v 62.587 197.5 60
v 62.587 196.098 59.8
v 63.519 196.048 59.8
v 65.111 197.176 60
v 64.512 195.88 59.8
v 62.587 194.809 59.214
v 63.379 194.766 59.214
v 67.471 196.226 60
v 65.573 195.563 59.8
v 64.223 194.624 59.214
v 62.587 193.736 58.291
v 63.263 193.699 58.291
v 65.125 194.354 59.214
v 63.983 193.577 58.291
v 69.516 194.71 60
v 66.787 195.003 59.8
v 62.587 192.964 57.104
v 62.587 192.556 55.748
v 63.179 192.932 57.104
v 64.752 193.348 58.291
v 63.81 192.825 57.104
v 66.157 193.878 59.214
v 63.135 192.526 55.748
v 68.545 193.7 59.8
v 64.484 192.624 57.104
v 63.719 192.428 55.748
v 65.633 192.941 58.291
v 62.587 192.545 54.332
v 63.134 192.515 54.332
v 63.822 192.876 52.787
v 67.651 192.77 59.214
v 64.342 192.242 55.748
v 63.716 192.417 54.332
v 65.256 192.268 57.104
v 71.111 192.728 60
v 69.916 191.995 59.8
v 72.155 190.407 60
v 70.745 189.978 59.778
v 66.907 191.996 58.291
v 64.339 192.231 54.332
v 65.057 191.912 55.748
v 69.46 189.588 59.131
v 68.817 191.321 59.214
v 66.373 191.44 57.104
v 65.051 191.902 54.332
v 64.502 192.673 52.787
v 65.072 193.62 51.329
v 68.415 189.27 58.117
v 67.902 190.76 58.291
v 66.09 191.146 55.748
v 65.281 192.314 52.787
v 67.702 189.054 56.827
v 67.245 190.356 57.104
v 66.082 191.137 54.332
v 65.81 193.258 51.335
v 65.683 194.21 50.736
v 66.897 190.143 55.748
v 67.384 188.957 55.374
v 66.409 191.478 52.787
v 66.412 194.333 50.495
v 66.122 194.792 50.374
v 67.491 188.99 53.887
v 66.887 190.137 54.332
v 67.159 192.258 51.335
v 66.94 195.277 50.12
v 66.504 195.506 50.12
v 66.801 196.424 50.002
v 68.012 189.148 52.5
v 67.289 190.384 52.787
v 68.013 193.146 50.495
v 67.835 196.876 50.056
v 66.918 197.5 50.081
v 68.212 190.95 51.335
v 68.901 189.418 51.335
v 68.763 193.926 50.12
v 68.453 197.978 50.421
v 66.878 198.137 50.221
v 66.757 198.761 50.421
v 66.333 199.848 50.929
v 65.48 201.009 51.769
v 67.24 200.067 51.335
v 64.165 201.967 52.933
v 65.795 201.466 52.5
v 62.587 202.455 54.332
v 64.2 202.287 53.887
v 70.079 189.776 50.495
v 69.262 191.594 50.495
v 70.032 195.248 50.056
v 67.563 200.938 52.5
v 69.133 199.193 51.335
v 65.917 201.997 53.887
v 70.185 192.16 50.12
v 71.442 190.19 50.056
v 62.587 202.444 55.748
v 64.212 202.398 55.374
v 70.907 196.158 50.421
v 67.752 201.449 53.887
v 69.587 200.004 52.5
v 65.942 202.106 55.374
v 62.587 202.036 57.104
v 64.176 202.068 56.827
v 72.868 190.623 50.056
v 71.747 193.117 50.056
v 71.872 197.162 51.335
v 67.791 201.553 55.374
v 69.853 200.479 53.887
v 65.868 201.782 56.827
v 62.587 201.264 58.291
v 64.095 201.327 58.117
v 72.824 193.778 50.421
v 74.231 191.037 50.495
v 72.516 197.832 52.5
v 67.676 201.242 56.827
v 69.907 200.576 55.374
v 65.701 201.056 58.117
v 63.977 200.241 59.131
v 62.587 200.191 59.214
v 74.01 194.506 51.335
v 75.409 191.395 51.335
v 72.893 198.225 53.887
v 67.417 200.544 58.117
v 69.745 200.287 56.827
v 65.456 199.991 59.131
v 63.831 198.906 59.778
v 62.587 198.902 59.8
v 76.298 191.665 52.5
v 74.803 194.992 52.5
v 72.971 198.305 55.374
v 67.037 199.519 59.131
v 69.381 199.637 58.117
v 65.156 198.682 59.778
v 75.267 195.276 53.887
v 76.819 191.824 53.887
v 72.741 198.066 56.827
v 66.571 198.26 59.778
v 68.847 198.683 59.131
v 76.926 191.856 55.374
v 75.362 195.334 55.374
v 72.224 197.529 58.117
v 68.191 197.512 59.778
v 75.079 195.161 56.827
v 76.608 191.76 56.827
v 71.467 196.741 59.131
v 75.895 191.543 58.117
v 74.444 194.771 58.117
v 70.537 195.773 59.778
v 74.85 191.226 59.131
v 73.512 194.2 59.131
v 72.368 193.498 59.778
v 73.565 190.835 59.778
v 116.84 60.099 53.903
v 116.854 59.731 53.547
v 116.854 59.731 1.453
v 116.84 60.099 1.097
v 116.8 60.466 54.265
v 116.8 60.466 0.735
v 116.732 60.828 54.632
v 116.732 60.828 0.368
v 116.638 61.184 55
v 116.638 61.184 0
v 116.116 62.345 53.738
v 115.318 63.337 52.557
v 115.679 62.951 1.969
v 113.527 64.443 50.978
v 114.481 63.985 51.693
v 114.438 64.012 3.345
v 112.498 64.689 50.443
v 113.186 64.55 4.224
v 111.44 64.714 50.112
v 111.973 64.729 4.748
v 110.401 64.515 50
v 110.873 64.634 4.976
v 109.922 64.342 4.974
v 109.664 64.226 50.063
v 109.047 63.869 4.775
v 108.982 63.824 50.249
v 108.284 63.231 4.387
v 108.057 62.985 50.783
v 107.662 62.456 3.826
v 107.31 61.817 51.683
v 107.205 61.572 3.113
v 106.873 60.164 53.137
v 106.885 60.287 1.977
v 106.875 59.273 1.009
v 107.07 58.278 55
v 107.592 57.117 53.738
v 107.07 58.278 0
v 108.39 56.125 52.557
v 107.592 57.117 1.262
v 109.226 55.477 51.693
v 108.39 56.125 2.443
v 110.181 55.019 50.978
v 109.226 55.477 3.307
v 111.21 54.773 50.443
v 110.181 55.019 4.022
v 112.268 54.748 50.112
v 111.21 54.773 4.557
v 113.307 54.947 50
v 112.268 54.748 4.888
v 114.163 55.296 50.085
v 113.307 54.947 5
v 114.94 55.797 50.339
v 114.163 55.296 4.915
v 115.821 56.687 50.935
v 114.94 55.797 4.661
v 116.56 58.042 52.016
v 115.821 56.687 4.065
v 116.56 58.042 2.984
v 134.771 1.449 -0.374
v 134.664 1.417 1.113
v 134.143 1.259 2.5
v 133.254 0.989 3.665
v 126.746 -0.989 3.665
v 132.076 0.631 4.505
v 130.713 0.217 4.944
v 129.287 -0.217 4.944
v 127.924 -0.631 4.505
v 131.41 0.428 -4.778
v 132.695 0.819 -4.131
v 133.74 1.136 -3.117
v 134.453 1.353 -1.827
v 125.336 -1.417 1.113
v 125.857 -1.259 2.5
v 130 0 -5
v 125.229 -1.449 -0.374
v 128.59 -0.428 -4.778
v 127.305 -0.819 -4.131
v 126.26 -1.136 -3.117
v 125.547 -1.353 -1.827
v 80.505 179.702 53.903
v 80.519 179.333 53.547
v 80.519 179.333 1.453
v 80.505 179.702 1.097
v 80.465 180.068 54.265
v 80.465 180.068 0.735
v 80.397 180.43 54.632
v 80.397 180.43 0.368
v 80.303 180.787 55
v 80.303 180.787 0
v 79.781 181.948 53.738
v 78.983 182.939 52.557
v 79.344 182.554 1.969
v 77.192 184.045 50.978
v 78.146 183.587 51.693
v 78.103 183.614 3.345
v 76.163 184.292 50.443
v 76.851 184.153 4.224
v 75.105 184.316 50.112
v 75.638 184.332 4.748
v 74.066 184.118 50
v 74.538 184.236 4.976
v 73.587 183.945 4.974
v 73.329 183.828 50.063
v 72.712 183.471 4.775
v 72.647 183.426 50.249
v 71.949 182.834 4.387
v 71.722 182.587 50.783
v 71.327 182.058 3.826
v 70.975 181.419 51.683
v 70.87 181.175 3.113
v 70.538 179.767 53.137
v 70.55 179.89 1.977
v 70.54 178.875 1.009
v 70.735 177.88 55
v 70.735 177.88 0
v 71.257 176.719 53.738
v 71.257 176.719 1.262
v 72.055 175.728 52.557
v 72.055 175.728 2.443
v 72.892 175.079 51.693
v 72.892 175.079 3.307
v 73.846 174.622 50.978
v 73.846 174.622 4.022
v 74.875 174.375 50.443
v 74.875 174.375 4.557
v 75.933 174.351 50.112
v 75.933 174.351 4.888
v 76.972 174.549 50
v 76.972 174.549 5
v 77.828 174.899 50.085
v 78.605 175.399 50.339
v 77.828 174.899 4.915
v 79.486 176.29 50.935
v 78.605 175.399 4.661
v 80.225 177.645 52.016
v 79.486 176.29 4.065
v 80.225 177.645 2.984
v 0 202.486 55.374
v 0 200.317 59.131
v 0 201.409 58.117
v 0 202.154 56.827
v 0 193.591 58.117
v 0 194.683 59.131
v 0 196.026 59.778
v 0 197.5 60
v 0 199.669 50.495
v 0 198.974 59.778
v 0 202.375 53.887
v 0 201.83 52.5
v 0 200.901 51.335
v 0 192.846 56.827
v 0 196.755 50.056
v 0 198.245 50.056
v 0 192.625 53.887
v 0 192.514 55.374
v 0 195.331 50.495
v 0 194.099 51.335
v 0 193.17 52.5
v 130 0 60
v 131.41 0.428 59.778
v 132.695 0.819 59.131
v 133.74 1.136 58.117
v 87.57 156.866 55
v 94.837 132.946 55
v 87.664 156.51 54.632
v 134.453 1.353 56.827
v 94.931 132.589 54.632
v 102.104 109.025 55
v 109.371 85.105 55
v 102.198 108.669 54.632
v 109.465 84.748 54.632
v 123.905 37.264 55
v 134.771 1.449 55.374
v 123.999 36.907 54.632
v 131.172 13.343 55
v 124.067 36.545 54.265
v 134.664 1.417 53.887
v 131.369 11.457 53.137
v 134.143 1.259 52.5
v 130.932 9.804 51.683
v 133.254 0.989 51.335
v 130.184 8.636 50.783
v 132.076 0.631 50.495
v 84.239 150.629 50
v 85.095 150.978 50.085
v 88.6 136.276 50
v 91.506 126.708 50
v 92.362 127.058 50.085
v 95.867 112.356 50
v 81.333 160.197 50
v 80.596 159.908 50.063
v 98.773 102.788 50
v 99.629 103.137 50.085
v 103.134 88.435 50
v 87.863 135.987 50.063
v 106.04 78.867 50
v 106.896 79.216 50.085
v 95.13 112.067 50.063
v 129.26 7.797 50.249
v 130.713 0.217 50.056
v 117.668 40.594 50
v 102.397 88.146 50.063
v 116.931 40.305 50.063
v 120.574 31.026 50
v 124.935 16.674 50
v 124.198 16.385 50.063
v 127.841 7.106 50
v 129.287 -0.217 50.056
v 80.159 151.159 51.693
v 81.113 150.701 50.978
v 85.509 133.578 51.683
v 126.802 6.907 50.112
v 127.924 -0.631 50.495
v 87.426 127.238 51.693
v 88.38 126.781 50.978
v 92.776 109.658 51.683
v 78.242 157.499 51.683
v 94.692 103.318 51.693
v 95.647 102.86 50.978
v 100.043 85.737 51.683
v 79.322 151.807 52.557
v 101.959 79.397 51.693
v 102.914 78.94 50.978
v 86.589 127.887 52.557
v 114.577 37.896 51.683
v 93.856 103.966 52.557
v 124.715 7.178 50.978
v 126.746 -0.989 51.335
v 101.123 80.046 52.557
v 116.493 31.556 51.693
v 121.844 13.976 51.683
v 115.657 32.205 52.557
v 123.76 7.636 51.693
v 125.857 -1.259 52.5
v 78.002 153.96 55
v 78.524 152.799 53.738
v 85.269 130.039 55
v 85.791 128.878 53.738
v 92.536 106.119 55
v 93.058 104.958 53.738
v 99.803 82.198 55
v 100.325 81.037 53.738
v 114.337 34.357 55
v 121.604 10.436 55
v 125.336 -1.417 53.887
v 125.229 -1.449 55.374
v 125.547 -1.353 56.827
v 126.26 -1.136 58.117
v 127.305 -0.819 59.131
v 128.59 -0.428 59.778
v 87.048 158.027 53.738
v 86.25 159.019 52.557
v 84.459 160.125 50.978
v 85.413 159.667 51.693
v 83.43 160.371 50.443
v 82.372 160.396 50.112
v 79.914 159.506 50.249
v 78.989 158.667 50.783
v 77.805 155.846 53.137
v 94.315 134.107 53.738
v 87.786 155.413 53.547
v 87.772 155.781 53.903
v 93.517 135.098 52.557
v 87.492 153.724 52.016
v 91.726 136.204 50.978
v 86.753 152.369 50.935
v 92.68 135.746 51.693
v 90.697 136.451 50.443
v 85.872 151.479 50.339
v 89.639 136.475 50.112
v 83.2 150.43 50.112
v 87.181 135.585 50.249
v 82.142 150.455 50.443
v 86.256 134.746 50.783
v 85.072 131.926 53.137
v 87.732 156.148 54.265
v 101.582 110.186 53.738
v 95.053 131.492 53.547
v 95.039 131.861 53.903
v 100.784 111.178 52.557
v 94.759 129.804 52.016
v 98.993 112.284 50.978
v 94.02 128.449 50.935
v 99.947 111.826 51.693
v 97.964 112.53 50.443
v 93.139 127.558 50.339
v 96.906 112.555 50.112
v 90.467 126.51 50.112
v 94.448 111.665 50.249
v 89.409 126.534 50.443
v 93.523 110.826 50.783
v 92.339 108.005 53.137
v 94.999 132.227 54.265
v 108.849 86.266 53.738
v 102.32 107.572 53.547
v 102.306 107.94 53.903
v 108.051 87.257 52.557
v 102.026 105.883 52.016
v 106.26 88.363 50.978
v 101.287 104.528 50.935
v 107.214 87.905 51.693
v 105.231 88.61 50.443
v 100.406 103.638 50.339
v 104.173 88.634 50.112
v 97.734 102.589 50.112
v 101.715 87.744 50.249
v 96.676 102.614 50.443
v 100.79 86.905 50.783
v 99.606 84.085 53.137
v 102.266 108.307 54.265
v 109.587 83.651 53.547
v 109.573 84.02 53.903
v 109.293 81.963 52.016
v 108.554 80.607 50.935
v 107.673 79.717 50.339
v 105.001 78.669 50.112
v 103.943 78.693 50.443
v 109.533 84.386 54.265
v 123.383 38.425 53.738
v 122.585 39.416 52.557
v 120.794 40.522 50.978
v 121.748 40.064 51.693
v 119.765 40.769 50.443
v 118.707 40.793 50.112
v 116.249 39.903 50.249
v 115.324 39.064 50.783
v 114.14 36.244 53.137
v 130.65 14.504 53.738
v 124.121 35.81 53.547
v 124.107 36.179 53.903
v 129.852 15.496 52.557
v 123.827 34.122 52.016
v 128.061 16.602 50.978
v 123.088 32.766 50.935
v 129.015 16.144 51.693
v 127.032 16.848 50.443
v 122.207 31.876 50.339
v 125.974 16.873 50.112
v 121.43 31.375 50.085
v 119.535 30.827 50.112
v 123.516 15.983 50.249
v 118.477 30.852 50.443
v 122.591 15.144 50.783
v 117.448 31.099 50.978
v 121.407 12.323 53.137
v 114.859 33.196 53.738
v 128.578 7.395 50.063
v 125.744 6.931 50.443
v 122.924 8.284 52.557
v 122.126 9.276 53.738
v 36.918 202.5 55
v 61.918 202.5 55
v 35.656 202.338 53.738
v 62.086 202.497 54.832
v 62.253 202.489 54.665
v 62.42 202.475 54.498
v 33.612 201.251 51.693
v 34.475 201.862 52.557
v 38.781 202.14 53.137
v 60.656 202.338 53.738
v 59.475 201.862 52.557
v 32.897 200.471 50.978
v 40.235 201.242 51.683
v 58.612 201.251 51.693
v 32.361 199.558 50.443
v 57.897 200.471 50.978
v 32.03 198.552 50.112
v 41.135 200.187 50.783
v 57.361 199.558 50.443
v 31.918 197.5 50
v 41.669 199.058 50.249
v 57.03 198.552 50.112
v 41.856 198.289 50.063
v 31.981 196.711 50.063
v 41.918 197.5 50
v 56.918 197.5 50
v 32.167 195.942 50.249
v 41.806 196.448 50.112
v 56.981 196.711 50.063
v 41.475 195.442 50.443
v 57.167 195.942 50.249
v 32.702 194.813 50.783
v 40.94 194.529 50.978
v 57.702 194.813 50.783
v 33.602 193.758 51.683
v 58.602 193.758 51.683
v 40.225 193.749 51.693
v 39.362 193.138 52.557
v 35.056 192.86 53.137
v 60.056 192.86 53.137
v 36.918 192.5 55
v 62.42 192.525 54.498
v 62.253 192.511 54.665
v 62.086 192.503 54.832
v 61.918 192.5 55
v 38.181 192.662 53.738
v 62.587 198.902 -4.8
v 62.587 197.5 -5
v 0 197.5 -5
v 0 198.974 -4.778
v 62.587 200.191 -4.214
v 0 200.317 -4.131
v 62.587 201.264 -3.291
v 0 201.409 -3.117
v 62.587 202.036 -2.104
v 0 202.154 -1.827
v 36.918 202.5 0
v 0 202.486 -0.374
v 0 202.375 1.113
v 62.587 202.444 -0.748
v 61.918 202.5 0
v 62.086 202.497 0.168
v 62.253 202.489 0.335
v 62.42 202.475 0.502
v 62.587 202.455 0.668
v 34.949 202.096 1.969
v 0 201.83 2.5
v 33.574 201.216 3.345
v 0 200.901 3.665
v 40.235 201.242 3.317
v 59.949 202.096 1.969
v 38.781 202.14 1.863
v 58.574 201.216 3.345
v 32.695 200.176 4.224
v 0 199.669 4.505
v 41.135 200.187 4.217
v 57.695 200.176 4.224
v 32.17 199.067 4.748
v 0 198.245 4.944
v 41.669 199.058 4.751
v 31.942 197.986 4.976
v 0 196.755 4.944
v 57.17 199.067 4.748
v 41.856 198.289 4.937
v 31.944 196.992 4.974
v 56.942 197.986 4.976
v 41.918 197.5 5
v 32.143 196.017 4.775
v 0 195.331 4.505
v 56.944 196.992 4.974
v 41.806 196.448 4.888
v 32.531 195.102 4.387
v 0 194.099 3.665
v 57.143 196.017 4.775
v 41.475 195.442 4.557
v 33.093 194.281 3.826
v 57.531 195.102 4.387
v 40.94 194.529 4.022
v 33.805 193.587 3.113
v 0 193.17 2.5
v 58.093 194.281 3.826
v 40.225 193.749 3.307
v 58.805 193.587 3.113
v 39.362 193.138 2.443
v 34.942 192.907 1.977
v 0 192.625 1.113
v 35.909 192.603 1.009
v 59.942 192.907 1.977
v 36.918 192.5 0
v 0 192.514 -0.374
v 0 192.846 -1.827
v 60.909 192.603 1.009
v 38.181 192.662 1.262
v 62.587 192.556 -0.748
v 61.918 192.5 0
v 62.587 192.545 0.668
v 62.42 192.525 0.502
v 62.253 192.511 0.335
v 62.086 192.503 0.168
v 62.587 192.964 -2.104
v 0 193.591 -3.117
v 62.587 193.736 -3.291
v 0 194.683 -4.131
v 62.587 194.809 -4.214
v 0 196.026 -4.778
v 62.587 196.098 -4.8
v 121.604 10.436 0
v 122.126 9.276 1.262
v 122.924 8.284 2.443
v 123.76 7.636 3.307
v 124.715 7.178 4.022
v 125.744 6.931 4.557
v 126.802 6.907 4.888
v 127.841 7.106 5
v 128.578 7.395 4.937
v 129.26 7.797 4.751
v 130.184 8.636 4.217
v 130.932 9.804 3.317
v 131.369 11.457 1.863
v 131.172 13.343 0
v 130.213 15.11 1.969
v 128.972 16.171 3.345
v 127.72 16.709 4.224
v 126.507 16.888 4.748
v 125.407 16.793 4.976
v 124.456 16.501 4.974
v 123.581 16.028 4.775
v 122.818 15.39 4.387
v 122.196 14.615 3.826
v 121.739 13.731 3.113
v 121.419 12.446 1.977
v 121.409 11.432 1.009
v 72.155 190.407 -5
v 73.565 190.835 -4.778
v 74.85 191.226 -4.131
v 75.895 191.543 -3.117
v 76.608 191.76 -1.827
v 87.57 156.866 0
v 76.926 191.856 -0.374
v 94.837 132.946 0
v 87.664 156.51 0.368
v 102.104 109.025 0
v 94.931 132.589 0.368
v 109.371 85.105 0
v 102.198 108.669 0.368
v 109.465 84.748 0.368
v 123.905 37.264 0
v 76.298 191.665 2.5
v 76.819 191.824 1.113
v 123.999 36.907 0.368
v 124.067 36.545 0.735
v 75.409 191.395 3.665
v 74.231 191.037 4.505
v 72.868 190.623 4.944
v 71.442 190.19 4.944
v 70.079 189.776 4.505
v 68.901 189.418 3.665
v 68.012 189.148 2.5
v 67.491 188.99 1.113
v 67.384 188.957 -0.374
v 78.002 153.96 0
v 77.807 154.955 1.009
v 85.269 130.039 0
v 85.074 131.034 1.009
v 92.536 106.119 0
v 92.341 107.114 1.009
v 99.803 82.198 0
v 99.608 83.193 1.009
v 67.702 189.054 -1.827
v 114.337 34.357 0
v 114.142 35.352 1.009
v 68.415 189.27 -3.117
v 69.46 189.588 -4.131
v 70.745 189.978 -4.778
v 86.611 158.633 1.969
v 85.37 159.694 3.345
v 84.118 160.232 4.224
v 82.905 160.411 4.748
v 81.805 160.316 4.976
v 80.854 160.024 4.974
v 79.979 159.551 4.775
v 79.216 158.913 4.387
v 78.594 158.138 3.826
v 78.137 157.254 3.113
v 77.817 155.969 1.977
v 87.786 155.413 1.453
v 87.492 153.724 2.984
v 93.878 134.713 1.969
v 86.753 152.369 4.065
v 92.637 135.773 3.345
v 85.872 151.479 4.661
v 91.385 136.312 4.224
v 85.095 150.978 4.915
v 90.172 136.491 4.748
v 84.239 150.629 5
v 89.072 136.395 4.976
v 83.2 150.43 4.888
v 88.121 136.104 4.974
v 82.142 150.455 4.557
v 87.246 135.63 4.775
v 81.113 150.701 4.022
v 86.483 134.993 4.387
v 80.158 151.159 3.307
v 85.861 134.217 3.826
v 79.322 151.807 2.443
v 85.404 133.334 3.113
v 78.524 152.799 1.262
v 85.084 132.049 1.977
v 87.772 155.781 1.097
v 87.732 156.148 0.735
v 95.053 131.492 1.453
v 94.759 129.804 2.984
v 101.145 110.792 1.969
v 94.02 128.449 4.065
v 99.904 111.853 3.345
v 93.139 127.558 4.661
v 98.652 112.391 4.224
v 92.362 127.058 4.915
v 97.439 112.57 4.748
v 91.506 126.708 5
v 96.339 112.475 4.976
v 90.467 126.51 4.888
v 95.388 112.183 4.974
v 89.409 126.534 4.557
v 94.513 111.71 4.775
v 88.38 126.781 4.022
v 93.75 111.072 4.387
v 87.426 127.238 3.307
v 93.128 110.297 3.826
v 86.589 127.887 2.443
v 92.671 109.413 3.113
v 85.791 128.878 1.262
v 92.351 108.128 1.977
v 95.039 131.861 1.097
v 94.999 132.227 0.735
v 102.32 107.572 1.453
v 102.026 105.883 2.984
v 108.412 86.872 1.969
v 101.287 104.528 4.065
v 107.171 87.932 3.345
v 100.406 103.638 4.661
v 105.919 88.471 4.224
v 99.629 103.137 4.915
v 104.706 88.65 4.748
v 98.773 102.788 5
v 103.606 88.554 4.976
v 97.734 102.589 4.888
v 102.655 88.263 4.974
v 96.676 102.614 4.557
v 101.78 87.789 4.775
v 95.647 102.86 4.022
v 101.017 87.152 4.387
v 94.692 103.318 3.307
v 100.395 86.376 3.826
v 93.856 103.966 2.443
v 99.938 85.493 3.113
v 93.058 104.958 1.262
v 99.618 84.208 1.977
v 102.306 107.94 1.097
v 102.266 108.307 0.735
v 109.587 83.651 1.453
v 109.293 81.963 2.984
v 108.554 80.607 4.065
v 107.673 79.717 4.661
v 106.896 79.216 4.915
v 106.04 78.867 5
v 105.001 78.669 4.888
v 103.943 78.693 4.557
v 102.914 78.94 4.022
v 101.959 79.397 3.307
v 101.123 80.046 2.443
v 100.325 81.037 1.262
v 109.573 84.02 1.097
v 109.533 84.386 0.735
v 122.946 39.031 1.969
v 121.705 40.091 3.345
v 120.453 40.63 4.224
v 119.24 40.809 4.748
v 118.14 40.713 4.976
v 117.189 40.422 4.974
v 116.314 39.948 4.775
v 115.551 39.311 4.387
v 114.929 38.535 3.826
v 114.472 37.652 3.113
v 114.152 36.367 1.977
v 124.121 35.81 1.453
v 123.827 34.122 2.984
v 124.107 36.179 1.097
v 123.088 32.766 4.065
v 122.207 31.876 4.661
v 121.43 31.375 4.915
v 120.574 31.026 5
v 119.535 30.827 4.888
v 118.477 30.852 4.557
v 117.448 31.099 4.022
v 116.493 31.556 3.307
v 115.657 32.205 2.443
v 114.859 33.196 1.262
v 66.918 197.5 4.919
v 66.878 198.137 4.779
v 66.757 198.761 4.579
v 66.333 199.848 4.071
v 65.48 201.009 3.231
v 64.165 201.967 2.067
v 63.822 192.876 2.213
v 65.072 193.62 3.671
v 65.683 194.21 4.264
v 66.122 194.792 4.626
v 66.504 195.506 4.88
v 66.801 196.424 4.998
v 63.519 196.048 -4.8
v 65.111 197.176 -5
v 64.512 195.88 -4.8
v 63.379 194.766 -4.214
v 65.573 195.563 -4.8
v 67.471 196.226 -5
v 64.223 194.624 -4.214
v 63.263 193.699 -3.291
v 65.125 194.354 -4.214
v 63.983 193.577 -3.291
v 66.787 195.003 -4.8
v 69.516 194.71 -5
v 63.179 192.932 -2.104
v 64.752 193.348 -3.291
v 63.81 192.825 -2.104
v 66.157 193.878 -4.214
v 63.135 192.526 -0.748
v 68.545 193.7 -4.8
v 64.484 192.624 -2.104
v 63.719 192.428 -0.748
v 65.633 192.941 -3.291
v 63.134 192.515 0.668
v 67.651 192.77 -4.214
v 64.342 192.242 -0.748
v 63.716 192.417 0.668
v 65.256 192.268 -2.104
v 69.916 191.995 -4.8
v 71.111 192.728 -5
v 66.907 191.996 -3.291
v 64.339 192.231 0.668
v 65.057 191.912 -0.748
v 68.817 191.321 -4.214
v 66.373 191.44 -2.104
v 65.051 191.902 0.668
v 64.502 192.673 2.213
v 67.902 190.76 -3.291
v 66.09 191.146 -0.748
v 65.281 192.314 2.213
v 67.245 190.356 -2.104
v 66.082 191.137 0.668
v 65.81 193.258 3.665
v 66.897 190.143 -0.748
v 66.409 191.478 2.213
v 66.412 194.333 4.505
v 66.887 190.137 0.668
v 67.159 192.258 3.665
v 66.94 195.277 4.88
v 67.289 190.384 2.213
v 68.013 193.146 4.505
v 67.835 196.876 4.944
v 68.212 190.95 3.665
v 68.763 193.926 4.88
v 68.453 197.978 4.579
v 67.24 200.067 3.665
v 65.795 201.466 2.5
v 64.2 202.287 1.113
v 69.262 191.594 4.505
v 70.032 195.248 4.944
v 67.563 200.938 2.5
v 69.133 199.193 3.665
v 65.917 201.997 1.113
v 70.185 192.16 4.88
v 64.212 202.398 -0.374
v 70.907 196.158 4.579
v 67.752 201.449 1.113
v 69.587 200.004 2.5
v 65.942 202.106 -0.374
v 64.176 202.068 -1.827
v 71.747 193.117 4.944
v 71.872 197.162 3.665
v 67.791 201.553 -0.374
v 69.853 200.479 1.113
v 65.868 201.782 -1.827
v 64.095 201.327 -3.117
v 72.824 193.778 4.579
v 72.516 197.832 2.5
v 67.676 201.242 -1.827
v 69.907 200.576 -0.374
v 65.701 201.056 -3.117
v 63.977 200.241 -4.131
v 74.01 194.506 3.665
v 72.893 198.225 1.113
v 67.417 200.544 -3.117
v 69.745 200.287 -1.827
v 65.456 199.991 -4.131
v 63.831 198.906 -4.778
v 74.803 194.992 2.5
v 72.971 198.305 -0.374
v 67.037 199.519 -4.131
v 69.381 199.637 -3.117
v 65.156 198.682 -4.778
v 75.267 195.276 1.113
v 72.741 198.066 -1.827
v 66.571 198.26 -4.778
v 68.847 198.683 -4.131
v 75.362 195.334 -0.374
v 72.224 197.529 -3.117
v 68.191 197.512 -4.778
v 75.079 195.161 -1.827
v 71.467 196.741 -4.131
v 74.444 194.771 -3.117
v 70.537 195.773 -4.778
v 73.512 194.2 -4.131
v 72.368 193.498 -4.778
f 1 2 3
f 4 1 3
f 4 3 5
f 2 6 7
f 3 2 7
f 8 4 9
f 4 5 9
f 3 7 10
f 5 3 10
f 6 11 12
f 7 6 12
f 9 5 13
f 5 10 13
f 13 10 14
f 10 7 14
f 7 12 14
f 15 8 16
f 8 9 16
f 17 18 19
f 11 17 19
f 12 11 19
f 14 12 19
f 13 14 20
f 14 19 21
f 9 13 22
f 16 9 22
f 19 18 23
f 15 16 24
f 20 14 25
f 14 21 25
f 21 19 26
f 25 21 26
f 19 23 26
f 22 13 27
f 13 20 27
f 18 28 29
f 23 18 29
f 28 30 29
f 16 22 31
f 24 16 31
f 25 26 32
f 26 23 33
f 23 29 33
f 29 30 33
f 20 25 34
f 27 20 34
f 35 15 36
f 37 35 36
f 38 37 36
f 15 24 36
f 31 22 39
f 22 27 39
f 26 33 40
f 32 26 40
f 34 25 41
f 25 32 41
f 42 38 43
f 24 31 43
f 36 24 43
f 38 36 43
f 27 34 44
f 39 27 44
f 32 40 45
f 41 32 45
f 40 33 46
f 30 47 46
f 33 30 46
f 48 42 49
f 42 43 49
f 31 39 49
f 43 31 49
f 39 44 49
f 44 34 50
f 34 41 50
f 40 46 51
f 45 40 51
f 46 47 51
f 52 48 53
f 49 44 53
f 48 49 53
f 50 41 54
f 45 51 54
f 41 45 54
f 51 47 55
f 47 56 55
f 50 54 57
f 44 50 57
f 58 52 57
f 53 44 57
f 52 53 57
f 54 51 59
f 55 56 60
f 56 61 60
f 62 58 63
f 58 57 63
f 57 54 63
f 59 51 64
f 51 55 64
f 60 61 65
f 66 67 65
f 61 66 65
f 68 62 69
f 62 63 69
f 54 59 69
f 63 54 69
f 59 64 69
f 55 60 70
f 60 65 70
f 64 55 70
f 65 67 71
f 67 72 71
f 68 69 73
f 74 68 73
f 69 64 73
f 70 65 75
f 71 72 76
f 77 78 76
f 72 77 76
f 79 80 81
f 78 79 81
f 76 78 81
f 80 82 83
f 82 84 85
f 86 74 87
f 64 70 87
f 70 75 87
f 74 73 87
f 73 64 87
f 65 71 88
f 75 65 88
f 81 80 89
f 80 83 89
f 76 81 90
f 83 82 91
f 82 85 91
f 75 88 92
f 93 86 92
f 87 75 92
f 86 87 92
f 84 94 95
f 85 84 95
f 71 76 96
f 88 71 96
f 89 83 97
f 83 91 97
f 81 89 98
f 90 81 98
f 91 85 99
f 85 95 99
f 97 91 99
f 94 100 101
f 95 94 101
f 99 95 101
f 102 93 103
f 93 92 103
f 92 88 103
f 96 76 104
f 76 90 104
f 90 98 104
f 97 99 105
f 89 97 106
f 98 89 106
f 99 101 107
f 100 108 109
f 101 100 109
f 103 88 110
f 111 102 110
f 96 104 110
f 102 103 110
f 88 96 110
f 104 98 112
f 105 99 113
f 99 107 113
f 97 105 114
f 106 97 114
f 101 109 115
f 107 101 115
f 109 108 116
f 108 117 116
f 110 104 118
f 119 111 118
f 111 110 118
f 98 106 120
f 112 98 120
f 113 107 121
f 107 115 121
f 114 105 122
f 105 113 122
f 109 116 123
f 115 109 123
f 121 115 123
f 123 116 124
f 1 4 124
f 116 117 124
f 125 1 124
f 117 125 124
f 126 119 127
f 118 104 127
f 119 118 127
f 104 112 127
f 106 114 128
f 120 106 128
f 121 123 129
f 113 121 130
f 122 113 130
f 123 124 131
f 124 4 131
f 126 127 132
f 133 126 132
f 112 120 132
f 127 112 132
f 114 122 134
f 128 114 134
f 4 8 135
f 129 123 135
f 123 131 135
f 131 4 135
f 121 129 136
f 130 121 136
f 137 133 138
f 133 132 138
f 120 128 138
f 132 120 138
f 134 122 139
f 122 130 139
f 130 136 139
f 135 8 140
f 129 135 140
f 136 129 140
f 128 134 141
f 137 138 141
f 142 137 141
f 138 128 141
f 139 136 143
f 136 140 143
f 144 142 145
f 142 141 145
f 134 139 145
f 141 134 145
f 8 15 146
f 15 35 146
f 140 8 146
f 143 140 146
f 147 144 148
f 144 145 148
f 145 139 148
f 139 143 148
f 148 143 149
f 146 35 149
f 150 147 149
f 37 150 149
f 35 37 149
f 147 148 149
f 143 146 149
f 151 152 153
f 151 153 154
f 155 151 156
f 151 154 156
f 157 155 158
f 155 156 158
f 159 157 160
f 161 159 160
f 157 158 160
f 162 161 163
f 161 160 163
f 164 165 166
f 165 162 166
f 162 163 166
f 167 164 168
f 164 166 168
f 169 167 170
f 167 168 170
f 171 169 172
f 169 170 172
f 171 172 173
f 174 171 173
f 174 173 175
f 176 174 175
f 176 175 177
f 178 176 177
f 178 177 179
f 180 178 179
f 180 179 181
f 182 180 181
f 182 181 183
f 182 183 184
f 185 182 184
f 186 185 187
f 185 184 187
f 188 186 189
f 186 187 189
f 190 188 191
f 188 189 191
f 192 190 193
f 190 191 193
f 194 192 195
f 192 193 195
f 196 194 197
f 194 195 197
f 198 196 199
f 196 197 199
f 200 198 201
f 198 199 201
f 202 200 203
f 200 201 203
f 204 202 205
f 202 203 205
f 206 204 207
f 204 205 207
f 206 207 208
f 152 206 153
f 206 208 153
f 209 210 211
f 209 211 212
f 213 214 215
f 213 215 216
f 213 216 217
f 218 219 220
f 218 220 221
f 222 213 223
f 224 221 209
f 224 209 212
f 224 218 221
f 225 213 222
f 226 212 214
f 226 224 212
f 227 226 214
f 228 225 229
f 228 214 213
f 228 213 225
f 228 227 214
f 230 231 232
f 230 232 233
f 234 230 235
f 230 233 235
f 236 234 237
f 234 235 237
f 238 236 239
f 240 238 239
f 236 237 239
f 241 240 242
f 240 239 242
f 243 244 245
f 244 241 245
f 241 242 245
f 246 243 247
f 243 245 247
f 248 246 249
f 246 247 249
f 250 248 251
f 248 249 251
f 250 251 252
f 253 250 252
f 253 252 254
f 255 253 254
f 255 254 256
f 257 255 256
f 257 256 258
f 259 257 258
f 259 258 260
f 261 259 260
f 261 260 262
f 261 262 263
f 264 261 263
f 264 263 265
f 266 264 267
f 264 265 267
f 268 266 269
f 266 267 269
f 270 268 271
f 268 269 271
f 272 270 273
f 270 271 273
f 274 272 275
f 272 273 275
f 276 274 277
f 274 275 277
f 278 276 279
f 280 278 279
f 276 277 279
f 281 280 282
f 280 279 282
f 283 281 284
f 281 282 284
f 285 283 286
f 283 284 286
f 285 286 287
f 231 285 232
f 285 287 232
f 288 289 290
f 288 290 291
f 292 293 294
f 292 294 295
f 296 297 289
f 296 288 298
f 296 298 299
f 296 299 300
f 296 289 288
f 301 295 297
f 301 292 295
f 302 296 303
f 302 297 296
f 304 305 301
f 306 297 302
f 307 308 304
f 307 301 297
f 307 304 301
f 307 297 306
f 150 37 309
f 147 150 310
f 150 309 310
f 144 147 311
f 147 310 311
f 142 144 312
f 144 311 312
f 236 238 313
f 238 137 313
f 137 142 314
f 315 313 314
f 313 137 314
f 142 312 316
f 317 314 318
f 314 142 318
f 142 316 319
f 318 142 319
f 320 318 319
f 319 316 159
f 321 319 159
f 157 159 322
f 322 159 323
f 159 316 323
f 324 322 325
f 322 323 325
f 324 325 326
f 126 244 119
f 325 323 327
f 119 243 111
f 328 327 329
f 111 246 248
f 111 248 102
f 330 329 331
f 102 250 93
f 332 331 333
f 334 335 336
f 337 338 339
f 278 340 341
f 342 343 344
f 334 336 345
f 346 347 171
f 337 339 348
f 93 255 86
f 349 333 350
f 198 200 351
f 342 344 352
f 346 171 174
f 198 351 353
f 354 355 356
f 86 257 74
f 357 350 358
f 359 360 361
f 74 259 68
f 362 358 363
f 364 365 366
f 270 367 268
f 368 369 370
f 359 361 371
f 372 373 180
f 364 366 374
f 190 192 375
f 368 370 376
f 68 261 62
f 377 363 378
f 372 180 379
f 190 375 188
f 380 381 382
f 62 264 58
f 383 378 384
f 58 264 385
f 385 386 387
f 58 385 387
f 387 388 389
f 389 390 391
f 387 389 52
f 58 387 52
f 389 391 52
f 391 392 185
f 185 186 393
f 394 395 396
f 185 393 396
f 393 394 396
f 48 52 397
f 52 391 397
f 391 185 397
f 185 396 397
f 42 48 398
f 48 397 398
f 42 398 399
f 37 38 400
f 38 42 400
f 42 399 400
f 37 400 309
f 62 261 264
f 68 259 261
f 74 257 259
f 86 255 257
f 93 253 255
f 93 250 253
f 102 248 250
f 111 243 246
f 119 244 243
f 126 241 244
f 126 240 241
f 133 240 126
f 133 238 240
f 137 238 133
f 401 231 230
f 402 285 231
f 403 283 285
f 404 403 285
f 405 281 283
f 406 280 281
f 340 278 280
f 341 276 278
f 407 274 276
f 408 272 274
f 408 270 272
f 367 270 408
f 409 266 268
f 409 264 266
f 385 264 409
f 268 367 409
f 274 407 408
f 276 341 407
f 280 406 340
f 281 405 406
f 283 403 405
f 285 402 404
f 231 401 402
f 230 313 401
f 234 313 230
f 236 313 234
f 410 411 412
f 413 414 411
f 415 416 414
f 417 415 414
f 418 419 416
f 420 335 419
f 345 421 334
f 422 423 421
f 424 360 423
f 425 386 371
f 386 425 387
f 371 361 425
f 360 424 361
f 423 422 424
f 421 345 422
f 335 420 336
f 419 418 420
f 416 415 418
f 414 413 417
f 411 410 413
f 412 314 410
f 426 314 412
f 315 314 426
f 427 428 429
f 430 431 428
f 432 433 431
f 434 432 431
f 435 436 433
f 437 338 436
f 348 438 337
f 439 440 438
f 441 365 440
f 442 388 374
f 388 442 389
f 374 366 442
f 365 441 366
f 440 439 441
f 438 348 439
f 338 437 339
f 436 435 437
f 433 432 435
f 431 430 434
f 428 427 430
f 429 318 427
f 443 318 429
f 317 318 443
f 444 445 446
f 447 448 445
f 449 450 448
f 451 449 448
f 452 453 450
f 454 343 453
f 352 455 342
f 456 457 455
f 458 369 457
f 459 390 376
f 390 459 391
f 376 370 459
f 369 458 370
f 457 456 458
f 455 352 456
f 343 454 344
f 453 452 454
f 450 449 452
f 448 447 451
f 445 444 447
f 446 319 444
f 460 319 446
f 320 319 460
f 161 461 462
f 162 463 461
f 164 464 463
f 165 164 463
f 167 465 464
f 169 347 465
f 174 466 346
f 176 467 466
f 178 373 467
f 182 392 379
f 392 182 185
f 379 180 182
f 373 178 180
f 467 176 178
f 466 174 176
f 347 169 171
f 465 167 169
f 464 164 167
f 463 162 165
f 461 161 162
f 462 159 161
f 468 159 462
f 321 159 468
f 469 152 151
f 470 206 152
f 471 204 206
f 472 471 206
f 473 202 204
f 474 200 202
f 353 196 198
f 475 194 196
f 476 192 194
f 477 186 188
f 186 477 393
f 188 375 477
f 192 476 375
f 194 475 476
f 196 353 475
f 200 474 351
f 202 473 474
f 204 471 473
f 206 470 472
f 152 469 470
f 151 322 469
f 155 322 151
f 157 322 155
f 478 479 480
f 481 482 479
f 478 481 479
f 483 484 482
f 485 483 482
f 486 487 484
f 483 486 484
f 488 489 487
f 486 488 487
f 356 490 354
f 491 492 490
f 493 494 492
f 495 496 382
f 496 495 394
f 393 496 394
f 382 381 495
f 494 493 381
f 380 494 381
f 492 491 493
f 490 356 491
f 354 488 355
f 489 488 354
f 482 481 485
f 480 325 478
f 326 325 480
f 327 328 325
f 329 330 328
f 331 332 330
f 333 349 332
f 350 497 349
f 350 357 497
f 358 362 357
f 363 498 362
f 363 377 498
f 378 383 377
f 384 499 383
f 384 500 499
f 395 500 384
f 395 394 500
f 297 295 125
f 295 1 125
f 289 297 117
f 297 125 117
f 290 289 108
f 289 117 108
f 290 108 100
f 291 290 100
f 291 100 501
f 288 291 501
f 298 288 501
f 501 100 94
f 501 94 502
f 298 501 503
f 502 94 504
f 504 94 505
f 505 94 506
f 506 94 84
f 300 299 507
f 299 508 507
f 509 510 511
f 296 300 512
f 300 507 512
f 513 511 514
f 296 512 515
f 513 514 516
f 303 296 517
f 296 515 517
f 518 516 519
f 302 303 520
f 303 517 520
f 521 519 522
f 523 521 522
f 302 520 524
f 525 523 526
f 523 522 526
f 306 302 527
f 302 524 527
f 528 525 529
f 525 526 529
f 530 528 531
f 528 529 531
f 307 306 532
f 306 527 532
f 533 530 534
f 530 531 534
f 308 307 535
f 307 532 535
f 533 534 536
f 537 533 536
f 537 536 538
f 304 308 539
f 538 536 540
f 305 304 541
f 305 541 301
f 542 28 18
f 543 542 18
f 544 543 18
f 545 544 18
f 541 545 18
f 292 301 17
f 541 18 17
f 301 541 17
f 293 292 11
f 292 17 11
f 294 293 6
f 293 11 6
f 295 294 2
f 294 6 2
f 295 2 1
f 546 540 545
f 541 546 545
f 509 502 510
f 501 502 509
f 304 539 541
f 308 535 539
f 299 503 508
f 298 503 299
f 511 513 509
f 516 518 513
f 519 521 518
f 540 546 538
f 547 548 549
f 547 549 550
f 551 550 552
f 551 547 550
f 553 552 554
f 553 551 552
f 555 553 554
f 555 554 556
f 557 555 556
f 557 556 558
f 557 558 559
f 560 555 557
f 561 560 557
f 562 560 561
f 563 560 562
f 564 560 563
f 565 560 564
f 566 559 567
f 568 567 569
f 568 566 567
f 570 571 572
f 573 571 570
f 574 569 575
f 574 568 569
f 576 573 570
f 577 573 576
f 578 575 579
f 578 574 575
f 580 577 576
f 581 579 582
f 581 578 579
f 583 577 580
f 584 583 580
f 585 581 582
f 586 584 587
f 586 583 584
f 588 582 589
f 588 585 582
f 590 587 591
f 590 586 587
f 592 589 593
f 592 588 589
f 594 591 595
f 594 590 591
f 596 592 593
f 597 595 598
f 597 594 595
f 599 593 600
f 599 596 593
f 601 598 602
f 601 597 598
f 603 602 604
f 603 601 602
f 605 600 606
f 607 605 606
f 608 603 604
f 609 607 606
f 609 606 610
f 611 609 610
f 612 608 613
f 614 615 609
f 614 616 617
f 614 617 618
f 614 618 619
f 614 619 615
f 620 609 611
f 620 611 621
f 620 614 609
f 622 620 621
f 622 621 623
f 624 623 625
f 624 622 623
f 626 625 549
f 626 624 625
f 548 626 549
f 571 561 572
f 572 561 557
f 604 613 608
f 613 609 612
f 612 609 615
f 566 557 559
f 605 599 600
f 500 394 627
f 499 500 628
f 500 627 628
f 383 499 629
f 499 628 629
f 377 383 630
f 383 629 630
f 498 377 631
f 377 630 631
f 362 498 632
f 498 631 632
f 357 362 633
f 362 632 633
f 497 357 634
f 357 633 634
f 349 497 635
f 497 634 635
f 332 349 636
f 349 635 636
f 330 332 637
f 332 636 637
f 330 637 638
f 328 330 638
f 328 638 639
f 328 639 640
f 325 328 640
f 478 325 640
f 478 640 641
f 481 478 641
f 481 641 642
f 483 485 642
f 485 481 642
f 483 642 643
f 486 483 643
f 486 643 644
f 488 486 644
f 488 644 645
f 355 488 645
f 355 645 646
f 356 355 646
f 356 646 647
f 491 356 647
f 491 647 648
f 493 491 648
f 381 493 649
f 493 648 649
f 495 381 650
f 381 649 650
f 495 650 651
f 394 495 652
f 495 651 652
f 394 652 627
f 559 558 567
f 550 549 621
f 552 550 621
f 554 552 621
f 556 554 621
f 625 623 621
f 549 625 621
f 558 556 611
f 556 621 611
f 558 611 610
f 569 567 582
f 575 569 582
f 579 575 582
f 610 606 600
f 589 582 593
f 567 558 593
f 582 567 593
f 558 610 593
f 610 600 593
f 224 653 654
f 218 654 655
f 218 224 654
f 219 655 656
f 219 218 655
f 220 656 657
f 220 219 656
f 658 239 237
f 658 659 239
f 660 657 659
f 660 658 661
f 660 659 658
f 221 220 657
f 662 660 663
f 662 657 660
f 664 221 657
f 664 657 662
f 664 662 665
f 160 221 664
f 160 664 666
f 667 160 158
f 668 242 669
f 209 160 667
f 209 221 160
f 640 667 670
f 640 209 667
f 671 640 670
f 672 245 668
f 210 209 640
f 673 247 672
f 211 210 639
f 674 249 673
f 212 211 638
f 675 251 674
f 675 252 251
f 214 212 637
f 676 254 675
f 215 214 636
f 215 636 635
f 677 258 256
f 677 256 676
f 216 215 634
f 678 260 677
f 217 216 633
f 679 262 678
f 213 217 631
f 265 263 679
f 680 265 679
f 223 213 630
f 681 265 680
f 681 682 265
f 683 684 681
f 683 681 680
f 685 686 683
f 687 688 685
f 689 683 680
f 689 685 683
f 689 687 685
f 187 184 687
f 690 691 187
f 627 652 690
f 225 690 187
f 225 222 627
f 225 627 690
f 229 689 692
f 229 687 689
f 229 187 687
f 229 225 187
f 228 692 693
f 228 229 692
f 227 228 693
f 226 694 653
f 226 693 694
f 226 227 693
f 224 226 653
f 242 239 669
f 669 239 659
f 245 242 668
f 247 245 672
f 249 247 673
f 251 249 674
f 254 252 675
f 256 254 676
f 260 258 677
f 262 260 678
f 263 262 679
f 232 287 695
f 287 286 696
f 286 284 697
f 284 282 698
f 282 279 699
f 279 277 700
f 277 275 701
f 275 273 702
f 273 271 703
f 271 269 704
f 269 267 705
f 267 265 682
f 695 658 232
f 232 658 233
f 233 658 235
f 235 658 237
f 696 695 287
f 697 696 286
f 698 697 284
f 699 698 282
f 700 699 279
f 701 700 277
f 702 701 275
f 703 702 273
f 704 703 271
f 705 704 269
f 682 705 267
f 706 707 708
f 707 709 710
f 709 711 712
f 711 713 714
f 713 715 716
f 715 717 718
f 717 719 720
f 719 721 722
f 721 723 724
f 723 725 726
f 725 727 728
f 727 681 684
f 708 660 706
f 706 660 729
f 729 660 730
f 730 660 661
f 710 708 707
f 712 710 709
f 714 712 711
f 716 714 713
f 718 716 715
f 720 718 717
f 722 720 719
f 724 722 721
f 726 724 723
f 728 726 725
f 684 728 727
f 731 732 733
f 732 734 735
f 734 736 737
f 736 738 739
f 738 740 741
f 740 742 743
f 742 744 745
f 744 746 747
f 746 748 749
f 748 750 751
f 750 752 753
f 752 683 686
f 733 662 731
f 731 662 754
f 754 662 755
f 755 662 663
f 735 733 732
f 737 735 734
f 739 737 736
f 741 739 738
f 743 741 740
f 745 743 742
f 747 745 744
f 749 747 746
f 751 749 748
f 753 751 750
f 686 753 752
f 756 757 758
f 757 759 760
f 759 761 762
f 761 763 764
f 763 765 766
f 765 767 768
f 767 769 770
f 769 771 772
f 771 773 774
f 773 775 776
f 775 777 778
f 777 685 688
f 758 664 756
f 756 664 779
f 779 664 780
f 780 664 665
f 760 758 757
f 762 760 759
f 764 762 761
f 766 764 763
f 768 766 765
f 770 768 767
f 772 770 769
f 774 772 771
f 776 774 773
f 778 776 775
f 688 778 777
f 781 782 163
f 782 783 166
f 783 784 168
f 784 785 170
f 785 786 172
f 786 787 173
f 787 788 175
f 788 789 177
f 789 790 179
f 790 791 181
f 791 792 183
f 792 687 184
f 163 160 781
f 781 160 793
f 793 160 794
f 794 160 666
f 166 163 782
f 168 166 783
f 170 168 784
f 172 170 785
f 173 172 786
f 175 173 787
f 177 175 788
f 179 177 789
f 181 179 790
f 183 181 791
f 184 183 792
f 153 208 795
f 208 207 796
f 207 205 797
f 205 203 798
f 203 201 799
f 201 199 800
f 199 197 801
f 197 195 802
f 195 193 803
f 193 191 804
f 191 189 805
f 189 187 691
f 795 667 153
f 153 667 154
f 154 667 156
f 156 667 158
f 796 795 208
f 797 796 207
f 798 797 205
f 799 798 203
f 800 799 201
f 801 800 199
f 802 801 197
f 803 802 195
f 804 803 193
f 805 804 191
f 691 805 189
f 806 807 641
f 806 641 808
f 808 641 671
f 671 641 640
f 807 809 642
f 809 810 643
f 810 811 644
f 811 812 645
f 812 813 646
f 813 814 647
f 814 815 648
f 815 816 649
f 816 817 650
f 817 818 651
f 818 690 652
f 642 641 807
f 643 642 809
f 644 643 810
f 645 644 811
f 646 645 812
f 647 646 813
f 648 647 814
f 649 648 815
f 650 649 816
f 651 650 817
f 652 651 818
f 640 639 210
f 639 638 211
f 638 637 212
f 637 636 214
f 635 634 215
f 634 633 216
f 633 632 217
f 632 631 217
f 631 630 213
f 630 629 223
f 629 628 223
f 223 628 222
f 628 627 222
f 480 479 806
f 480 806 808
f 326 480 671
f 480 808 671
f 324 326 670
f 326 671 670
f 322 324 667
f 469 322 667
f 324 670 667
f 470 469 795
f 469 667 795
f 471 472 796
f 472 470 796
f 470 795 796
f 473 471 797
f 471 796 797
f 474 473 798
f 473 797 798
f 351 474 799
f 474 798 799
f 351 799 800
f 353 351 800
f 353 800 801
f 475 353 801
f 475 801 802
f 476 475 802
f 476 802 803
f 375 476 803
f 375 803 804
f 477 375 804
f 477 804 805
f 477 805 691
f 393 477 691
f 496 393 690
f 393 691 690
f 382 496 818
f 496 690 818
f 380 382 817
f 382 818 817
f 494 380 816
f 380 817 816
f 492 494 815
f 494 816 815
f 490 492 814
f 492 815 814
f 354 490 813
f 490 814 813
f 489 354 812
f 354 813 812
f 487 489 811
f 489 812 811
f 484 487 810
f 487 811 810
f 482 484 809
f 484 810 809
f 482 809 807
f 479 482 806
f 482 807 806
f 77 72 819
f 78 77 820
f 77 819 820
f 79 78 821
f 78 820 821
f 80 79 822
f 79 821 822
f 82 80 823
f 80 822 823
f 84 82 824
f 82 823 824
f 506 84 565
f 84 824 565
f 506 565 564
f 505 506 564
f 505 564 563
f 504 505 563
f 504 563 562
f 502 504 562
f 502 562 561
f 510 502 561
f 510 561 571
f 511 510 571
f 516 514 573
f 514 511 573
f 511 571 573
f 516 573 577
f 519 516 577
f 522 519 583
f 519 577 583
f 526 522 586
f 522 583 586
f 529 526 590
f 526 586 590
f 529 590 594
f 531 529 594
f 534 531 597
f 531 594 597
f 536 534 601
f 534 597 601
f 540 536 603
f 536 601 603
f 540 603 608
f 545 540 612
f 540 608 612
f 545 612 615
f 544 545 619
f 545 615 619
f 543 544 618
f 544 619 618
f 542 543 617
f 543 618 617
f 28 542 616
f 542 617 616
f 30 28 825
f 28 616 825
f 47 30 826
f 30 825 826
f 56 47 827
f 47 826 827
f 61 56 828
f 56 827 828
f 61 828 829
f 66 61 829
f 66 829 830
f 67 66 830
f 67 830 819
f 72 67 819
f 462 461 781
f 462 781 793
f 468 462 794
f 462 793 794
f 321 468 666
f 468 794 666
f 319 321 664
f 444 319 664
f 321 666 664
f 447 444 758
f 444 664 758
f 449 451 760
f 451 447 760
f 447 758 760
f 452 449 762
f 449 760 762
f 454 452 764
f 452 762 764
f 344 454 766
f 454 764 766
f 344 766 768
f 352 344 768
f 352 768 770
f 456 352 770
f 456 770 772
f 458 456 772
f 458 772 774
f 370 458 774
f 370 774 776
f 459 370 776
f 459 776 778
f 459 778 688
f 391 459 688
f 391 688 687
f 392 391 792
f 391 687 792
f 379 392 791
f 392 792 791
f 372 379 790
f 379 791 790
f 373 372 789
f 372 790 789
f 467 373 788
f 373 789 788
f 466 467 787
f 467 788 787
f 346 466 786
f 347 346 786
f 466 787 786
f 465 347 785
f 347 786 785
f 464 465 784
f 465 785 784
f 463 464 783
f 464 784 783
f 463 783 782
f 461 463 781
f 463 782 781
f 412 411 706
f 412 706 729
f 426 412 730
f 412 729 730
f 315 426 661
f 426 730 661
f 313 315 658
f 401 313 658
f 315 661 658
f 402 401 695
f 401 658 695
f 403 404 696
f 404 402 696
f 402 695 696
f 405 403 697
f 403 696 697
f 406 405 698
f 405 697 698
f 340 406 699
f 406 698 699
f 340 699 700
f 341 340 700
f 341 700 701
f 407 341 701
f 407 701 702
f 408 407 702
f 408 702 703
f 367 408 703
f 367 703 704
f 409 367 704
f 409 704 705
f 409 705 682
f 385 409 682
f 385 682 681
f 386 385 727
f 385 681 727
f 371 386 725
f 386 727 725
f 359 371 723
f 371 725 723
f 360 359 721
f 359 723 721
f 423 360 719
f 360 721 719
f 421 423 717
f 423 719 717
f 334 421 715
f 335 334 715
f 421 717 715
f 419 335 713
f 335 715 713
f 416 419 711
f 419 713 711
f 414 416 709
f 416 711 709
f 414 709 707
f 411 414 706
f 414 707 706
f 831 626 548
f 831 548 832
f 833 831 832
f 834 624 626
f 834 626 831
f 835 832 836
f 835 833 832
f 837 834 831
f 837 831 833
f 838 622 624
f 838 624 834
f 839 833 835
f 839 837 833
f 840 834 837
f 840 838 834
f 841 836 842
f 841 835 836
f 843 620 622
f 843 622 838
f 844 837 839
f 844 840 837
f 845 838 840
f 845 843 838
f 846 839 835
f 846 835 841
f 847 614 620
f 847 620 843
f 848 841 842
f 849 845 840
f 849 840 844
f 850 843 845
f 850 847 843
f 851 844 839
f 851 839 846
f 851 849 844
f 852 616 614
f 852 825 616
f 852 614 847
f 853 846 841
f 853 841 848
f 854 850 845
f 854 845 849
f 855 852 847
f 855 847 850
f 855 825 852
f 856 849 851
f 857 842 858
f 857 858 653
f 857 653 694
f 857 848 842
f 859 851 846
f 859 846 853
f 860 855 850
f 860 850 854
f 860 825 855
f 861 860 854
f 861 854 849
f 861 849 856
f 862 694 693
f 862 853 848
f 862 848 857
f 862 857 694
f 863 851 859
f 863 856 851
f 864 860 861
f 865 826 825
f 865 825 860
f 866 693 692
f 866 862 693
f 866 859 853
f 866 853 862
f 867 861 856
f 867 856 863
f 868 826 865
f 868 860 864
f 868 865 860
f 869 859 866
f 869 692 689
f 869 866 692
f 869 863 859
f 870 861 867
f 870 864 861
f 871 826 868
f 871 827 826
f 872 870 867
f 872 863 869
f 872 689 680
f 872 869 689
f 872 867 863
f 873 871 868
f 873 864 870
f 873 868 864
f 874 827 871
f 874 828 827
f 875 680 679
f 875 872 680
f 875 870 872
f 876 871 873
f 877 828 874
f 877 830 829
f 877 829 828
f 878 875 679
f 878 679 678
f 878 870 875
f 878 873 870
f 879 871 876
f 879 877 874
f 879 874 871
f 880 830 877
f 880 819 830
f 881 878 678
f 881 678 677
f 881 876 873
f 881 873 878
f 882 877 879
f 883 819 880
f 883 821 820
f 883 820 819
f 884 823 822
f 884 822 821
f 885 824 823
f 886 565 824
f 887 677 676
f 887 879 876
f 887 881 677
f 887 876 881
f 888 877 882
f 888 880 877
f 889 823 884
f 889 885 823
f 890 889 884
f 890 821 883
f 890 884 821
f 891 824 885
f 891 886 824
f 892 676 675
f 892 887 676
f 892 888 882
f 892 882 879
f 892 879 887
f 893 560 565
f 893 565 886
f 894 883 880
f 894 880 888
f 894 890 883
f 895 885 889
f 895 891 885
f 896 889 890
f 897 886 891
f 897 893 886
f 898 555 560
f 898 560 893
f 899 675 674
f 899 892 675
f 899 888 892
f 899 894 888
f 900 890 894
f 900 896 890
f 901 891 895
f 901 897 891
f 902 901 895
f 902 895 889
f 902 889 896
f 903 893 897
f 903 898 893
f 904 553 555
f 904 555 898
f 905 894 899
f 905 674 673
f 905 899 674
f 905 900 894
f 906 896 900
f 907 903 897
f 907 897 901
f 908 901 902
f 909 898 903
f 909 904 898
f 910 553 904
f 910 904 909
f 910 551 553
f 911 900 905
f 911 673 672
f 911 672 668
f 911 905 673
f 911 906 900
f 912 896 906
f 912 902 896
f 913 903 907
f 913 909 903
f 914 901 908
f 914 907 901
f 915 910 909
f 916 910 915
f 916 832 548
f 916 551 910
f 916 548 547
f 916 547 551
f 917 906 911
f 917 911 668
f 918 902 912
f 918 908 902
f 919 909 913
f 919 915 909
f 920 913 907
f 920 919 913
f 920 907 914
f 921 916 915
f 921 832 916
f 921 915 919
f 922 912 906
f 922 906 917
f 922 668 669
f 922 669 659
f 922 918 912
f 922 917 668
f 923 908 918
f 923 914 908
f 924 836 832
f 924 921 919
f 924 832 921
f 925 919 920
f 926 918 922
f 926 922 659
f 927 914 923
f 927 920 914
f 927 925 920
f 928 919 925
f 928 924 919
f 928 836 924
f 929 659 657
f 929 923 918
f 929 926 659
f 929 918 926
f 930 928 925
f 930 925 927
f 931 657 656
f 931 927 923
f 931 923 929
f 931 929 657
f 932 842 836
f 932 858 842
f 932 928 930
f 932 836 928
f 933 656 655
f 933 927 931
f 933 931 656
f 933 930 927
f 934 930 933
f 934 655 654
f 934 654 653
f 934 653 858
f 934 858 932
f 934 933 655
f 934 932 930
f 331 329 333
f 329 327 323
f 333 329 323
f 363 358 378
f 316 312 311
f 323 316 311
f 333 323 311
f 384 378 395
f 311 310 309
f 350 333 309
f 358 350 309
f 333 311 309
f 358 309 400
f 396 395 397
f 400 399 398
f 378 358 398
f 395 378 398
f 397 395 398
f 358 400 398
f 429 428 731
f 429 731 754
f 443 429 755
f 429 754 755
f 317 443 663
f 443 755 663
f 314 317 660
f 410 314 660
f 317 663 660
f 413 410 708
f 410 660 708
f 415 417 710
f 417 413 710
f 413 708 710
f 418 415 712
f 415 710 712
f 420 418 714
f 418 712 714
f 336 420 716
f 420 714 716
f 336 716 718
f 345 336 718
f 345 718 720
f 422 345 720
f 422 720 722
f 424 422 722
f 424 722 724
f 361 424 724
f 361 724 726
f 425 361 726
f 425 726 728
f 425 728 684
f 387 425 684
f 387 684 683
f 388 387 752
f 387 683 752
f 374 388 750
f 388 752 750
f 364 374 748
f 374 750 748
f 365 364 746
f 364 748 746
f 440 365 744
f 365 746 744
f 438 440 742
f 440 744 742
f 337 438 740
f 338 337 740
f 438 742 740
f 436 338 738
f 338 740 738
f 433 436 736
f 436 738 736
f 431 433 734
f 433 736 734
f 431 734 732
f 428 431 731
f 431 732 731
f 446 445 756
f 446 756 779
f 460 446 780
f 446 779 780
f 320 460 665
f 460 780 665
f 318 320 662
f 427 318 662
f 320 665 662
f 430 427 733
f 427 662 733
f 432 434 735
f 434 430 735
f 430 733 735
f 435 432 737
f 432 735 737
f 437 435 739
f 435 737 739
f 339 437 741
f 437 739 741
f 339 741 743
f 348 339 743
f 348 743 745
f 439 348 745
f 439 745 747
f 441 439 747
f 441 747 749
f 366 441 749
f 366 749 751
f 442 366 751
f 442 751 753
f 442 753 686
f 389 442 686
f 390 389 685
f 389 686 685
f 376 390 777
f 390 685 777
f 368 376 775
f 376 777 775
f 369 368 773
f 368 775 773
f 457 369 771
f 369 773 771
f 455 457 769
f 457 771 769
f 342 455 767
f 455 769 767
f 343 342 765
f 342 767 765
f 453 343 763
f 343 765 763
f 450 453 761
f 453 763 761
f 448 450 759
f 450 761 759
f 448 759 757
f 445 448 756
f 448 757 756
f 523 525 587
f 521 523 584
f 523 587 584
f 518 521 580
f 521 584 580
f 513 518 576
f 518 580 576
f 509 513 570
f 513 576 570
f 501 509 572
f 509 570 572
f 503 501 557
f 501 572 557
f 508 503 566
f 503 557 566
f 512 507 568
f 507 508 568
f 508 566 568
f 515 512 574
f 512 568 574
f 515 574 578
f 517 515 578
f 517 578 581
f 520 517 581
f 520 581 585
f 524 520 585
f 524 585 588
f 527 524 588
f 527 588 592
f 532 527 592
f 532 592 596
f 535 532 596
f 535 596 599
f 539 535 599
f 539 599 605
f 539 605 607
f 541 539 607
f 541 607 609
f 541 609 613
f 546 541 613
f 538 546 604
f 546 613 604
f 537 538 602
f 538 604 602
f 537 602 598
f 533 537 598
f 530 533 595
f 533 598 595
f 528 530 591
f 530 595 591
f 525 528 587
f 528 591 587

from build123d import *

# Parameters (mm, degrees)
SKETCH2_R             = 5
SKETCH4_R             = 5
BOSS_EXTRUDE1_DEPTH   = 55
CRVPATTERN1_START     = -1e-07
CRVPATTERN1_OUTLINE_R = 5
CRVPATTERN1_DEPTH     = 55.0000001


# Read off the part's stored shape, not the designer's step: CrvPattern1
with BuildPart() as part:
    # Sweep1: sweep along a path in Sketch1
    with BuildLine(Plane.XY) as sweep1_path:
        Line((0, 197.5), (62.586692935, 197.5))
        ThreePointArc((62.586692935, 197.5), (68.542028244, 195.533304511), (72.154897335, 190.406796273))
        Line((72.154897335, 190.406796273), (130, 0))
    # Sketch2 → Sweep1 (sweep)
    with BuildSketch(Plane(origin=(0, 0, 0), x_dir=(0, 0, -1), z_dir=(1, 0, 0))):
        with Locations((0, 197.5)):
            Circle(SKETCH2_R)
    sweep1 = sweep(path=sweep1_path.line)

    # Sketch4 → Boss-Extrude1 (add)
    with BuildSketch(Plane.XY):
        with Locations(Location((126.387902166, 11.889822036, 0), (0, 0, 196.898648694))):
            Circle(SKETCH4_R)
    extrude(amount=BOSS_EXTRUDE1_DEPTH)

    # CrvPattern1 outline → CrvPattern1 (add)
    with BuildSketch(Plane.XY.offset(CRVPATTERN1_START)):
        with Locations((119.120911483, 35.810333034)):
            Circle(CRVPATTERN1_OUTLINE_R)
        with Locations((111.8539208, 59.730844032)):
            Circle(CRVPATTERN1_OUTLINE_R)
        with Locations((104.586930117, 83.65135503)):
            Circle(CRVPATTERN1_OUTLINE_R)
        with Locations((97.319939434, 107.571866029)):
            Circle(CRVPATTERN1_OUTLINE_R)
        with Locations((90.052948751, 131.492377027)):
            Circle(CRVPATTERN1_OUTLINE_R)
        with Locations((82.785958068, 155.412888025)):
            Circle(CRVPATTERN1_OUTLINE_R)
        with Locations((75.518967385, 179.333399023)):
            Circle(CRVPATTERN1_OUTLINE_R)
        with Locations((61.918405072, 197.5)):
            Circle(CRVPATTERN1_OUTLINE_R)
        with Locations((36.918405072, 197.5)):
            Circle(CRVPATTERN1_OUTLINE_R)
    crvpattern1 = extrude(amount=CRVPATTERN1_DEPTH)

    # Mirror1: Sweep1, CrvPattern1 across plane
    add(sweep1.mirror(Plane.XY.offset(27.5)))
    add(crvpattern1.mirror(Plane.XY.offset(27.5)))


solid = part.part
